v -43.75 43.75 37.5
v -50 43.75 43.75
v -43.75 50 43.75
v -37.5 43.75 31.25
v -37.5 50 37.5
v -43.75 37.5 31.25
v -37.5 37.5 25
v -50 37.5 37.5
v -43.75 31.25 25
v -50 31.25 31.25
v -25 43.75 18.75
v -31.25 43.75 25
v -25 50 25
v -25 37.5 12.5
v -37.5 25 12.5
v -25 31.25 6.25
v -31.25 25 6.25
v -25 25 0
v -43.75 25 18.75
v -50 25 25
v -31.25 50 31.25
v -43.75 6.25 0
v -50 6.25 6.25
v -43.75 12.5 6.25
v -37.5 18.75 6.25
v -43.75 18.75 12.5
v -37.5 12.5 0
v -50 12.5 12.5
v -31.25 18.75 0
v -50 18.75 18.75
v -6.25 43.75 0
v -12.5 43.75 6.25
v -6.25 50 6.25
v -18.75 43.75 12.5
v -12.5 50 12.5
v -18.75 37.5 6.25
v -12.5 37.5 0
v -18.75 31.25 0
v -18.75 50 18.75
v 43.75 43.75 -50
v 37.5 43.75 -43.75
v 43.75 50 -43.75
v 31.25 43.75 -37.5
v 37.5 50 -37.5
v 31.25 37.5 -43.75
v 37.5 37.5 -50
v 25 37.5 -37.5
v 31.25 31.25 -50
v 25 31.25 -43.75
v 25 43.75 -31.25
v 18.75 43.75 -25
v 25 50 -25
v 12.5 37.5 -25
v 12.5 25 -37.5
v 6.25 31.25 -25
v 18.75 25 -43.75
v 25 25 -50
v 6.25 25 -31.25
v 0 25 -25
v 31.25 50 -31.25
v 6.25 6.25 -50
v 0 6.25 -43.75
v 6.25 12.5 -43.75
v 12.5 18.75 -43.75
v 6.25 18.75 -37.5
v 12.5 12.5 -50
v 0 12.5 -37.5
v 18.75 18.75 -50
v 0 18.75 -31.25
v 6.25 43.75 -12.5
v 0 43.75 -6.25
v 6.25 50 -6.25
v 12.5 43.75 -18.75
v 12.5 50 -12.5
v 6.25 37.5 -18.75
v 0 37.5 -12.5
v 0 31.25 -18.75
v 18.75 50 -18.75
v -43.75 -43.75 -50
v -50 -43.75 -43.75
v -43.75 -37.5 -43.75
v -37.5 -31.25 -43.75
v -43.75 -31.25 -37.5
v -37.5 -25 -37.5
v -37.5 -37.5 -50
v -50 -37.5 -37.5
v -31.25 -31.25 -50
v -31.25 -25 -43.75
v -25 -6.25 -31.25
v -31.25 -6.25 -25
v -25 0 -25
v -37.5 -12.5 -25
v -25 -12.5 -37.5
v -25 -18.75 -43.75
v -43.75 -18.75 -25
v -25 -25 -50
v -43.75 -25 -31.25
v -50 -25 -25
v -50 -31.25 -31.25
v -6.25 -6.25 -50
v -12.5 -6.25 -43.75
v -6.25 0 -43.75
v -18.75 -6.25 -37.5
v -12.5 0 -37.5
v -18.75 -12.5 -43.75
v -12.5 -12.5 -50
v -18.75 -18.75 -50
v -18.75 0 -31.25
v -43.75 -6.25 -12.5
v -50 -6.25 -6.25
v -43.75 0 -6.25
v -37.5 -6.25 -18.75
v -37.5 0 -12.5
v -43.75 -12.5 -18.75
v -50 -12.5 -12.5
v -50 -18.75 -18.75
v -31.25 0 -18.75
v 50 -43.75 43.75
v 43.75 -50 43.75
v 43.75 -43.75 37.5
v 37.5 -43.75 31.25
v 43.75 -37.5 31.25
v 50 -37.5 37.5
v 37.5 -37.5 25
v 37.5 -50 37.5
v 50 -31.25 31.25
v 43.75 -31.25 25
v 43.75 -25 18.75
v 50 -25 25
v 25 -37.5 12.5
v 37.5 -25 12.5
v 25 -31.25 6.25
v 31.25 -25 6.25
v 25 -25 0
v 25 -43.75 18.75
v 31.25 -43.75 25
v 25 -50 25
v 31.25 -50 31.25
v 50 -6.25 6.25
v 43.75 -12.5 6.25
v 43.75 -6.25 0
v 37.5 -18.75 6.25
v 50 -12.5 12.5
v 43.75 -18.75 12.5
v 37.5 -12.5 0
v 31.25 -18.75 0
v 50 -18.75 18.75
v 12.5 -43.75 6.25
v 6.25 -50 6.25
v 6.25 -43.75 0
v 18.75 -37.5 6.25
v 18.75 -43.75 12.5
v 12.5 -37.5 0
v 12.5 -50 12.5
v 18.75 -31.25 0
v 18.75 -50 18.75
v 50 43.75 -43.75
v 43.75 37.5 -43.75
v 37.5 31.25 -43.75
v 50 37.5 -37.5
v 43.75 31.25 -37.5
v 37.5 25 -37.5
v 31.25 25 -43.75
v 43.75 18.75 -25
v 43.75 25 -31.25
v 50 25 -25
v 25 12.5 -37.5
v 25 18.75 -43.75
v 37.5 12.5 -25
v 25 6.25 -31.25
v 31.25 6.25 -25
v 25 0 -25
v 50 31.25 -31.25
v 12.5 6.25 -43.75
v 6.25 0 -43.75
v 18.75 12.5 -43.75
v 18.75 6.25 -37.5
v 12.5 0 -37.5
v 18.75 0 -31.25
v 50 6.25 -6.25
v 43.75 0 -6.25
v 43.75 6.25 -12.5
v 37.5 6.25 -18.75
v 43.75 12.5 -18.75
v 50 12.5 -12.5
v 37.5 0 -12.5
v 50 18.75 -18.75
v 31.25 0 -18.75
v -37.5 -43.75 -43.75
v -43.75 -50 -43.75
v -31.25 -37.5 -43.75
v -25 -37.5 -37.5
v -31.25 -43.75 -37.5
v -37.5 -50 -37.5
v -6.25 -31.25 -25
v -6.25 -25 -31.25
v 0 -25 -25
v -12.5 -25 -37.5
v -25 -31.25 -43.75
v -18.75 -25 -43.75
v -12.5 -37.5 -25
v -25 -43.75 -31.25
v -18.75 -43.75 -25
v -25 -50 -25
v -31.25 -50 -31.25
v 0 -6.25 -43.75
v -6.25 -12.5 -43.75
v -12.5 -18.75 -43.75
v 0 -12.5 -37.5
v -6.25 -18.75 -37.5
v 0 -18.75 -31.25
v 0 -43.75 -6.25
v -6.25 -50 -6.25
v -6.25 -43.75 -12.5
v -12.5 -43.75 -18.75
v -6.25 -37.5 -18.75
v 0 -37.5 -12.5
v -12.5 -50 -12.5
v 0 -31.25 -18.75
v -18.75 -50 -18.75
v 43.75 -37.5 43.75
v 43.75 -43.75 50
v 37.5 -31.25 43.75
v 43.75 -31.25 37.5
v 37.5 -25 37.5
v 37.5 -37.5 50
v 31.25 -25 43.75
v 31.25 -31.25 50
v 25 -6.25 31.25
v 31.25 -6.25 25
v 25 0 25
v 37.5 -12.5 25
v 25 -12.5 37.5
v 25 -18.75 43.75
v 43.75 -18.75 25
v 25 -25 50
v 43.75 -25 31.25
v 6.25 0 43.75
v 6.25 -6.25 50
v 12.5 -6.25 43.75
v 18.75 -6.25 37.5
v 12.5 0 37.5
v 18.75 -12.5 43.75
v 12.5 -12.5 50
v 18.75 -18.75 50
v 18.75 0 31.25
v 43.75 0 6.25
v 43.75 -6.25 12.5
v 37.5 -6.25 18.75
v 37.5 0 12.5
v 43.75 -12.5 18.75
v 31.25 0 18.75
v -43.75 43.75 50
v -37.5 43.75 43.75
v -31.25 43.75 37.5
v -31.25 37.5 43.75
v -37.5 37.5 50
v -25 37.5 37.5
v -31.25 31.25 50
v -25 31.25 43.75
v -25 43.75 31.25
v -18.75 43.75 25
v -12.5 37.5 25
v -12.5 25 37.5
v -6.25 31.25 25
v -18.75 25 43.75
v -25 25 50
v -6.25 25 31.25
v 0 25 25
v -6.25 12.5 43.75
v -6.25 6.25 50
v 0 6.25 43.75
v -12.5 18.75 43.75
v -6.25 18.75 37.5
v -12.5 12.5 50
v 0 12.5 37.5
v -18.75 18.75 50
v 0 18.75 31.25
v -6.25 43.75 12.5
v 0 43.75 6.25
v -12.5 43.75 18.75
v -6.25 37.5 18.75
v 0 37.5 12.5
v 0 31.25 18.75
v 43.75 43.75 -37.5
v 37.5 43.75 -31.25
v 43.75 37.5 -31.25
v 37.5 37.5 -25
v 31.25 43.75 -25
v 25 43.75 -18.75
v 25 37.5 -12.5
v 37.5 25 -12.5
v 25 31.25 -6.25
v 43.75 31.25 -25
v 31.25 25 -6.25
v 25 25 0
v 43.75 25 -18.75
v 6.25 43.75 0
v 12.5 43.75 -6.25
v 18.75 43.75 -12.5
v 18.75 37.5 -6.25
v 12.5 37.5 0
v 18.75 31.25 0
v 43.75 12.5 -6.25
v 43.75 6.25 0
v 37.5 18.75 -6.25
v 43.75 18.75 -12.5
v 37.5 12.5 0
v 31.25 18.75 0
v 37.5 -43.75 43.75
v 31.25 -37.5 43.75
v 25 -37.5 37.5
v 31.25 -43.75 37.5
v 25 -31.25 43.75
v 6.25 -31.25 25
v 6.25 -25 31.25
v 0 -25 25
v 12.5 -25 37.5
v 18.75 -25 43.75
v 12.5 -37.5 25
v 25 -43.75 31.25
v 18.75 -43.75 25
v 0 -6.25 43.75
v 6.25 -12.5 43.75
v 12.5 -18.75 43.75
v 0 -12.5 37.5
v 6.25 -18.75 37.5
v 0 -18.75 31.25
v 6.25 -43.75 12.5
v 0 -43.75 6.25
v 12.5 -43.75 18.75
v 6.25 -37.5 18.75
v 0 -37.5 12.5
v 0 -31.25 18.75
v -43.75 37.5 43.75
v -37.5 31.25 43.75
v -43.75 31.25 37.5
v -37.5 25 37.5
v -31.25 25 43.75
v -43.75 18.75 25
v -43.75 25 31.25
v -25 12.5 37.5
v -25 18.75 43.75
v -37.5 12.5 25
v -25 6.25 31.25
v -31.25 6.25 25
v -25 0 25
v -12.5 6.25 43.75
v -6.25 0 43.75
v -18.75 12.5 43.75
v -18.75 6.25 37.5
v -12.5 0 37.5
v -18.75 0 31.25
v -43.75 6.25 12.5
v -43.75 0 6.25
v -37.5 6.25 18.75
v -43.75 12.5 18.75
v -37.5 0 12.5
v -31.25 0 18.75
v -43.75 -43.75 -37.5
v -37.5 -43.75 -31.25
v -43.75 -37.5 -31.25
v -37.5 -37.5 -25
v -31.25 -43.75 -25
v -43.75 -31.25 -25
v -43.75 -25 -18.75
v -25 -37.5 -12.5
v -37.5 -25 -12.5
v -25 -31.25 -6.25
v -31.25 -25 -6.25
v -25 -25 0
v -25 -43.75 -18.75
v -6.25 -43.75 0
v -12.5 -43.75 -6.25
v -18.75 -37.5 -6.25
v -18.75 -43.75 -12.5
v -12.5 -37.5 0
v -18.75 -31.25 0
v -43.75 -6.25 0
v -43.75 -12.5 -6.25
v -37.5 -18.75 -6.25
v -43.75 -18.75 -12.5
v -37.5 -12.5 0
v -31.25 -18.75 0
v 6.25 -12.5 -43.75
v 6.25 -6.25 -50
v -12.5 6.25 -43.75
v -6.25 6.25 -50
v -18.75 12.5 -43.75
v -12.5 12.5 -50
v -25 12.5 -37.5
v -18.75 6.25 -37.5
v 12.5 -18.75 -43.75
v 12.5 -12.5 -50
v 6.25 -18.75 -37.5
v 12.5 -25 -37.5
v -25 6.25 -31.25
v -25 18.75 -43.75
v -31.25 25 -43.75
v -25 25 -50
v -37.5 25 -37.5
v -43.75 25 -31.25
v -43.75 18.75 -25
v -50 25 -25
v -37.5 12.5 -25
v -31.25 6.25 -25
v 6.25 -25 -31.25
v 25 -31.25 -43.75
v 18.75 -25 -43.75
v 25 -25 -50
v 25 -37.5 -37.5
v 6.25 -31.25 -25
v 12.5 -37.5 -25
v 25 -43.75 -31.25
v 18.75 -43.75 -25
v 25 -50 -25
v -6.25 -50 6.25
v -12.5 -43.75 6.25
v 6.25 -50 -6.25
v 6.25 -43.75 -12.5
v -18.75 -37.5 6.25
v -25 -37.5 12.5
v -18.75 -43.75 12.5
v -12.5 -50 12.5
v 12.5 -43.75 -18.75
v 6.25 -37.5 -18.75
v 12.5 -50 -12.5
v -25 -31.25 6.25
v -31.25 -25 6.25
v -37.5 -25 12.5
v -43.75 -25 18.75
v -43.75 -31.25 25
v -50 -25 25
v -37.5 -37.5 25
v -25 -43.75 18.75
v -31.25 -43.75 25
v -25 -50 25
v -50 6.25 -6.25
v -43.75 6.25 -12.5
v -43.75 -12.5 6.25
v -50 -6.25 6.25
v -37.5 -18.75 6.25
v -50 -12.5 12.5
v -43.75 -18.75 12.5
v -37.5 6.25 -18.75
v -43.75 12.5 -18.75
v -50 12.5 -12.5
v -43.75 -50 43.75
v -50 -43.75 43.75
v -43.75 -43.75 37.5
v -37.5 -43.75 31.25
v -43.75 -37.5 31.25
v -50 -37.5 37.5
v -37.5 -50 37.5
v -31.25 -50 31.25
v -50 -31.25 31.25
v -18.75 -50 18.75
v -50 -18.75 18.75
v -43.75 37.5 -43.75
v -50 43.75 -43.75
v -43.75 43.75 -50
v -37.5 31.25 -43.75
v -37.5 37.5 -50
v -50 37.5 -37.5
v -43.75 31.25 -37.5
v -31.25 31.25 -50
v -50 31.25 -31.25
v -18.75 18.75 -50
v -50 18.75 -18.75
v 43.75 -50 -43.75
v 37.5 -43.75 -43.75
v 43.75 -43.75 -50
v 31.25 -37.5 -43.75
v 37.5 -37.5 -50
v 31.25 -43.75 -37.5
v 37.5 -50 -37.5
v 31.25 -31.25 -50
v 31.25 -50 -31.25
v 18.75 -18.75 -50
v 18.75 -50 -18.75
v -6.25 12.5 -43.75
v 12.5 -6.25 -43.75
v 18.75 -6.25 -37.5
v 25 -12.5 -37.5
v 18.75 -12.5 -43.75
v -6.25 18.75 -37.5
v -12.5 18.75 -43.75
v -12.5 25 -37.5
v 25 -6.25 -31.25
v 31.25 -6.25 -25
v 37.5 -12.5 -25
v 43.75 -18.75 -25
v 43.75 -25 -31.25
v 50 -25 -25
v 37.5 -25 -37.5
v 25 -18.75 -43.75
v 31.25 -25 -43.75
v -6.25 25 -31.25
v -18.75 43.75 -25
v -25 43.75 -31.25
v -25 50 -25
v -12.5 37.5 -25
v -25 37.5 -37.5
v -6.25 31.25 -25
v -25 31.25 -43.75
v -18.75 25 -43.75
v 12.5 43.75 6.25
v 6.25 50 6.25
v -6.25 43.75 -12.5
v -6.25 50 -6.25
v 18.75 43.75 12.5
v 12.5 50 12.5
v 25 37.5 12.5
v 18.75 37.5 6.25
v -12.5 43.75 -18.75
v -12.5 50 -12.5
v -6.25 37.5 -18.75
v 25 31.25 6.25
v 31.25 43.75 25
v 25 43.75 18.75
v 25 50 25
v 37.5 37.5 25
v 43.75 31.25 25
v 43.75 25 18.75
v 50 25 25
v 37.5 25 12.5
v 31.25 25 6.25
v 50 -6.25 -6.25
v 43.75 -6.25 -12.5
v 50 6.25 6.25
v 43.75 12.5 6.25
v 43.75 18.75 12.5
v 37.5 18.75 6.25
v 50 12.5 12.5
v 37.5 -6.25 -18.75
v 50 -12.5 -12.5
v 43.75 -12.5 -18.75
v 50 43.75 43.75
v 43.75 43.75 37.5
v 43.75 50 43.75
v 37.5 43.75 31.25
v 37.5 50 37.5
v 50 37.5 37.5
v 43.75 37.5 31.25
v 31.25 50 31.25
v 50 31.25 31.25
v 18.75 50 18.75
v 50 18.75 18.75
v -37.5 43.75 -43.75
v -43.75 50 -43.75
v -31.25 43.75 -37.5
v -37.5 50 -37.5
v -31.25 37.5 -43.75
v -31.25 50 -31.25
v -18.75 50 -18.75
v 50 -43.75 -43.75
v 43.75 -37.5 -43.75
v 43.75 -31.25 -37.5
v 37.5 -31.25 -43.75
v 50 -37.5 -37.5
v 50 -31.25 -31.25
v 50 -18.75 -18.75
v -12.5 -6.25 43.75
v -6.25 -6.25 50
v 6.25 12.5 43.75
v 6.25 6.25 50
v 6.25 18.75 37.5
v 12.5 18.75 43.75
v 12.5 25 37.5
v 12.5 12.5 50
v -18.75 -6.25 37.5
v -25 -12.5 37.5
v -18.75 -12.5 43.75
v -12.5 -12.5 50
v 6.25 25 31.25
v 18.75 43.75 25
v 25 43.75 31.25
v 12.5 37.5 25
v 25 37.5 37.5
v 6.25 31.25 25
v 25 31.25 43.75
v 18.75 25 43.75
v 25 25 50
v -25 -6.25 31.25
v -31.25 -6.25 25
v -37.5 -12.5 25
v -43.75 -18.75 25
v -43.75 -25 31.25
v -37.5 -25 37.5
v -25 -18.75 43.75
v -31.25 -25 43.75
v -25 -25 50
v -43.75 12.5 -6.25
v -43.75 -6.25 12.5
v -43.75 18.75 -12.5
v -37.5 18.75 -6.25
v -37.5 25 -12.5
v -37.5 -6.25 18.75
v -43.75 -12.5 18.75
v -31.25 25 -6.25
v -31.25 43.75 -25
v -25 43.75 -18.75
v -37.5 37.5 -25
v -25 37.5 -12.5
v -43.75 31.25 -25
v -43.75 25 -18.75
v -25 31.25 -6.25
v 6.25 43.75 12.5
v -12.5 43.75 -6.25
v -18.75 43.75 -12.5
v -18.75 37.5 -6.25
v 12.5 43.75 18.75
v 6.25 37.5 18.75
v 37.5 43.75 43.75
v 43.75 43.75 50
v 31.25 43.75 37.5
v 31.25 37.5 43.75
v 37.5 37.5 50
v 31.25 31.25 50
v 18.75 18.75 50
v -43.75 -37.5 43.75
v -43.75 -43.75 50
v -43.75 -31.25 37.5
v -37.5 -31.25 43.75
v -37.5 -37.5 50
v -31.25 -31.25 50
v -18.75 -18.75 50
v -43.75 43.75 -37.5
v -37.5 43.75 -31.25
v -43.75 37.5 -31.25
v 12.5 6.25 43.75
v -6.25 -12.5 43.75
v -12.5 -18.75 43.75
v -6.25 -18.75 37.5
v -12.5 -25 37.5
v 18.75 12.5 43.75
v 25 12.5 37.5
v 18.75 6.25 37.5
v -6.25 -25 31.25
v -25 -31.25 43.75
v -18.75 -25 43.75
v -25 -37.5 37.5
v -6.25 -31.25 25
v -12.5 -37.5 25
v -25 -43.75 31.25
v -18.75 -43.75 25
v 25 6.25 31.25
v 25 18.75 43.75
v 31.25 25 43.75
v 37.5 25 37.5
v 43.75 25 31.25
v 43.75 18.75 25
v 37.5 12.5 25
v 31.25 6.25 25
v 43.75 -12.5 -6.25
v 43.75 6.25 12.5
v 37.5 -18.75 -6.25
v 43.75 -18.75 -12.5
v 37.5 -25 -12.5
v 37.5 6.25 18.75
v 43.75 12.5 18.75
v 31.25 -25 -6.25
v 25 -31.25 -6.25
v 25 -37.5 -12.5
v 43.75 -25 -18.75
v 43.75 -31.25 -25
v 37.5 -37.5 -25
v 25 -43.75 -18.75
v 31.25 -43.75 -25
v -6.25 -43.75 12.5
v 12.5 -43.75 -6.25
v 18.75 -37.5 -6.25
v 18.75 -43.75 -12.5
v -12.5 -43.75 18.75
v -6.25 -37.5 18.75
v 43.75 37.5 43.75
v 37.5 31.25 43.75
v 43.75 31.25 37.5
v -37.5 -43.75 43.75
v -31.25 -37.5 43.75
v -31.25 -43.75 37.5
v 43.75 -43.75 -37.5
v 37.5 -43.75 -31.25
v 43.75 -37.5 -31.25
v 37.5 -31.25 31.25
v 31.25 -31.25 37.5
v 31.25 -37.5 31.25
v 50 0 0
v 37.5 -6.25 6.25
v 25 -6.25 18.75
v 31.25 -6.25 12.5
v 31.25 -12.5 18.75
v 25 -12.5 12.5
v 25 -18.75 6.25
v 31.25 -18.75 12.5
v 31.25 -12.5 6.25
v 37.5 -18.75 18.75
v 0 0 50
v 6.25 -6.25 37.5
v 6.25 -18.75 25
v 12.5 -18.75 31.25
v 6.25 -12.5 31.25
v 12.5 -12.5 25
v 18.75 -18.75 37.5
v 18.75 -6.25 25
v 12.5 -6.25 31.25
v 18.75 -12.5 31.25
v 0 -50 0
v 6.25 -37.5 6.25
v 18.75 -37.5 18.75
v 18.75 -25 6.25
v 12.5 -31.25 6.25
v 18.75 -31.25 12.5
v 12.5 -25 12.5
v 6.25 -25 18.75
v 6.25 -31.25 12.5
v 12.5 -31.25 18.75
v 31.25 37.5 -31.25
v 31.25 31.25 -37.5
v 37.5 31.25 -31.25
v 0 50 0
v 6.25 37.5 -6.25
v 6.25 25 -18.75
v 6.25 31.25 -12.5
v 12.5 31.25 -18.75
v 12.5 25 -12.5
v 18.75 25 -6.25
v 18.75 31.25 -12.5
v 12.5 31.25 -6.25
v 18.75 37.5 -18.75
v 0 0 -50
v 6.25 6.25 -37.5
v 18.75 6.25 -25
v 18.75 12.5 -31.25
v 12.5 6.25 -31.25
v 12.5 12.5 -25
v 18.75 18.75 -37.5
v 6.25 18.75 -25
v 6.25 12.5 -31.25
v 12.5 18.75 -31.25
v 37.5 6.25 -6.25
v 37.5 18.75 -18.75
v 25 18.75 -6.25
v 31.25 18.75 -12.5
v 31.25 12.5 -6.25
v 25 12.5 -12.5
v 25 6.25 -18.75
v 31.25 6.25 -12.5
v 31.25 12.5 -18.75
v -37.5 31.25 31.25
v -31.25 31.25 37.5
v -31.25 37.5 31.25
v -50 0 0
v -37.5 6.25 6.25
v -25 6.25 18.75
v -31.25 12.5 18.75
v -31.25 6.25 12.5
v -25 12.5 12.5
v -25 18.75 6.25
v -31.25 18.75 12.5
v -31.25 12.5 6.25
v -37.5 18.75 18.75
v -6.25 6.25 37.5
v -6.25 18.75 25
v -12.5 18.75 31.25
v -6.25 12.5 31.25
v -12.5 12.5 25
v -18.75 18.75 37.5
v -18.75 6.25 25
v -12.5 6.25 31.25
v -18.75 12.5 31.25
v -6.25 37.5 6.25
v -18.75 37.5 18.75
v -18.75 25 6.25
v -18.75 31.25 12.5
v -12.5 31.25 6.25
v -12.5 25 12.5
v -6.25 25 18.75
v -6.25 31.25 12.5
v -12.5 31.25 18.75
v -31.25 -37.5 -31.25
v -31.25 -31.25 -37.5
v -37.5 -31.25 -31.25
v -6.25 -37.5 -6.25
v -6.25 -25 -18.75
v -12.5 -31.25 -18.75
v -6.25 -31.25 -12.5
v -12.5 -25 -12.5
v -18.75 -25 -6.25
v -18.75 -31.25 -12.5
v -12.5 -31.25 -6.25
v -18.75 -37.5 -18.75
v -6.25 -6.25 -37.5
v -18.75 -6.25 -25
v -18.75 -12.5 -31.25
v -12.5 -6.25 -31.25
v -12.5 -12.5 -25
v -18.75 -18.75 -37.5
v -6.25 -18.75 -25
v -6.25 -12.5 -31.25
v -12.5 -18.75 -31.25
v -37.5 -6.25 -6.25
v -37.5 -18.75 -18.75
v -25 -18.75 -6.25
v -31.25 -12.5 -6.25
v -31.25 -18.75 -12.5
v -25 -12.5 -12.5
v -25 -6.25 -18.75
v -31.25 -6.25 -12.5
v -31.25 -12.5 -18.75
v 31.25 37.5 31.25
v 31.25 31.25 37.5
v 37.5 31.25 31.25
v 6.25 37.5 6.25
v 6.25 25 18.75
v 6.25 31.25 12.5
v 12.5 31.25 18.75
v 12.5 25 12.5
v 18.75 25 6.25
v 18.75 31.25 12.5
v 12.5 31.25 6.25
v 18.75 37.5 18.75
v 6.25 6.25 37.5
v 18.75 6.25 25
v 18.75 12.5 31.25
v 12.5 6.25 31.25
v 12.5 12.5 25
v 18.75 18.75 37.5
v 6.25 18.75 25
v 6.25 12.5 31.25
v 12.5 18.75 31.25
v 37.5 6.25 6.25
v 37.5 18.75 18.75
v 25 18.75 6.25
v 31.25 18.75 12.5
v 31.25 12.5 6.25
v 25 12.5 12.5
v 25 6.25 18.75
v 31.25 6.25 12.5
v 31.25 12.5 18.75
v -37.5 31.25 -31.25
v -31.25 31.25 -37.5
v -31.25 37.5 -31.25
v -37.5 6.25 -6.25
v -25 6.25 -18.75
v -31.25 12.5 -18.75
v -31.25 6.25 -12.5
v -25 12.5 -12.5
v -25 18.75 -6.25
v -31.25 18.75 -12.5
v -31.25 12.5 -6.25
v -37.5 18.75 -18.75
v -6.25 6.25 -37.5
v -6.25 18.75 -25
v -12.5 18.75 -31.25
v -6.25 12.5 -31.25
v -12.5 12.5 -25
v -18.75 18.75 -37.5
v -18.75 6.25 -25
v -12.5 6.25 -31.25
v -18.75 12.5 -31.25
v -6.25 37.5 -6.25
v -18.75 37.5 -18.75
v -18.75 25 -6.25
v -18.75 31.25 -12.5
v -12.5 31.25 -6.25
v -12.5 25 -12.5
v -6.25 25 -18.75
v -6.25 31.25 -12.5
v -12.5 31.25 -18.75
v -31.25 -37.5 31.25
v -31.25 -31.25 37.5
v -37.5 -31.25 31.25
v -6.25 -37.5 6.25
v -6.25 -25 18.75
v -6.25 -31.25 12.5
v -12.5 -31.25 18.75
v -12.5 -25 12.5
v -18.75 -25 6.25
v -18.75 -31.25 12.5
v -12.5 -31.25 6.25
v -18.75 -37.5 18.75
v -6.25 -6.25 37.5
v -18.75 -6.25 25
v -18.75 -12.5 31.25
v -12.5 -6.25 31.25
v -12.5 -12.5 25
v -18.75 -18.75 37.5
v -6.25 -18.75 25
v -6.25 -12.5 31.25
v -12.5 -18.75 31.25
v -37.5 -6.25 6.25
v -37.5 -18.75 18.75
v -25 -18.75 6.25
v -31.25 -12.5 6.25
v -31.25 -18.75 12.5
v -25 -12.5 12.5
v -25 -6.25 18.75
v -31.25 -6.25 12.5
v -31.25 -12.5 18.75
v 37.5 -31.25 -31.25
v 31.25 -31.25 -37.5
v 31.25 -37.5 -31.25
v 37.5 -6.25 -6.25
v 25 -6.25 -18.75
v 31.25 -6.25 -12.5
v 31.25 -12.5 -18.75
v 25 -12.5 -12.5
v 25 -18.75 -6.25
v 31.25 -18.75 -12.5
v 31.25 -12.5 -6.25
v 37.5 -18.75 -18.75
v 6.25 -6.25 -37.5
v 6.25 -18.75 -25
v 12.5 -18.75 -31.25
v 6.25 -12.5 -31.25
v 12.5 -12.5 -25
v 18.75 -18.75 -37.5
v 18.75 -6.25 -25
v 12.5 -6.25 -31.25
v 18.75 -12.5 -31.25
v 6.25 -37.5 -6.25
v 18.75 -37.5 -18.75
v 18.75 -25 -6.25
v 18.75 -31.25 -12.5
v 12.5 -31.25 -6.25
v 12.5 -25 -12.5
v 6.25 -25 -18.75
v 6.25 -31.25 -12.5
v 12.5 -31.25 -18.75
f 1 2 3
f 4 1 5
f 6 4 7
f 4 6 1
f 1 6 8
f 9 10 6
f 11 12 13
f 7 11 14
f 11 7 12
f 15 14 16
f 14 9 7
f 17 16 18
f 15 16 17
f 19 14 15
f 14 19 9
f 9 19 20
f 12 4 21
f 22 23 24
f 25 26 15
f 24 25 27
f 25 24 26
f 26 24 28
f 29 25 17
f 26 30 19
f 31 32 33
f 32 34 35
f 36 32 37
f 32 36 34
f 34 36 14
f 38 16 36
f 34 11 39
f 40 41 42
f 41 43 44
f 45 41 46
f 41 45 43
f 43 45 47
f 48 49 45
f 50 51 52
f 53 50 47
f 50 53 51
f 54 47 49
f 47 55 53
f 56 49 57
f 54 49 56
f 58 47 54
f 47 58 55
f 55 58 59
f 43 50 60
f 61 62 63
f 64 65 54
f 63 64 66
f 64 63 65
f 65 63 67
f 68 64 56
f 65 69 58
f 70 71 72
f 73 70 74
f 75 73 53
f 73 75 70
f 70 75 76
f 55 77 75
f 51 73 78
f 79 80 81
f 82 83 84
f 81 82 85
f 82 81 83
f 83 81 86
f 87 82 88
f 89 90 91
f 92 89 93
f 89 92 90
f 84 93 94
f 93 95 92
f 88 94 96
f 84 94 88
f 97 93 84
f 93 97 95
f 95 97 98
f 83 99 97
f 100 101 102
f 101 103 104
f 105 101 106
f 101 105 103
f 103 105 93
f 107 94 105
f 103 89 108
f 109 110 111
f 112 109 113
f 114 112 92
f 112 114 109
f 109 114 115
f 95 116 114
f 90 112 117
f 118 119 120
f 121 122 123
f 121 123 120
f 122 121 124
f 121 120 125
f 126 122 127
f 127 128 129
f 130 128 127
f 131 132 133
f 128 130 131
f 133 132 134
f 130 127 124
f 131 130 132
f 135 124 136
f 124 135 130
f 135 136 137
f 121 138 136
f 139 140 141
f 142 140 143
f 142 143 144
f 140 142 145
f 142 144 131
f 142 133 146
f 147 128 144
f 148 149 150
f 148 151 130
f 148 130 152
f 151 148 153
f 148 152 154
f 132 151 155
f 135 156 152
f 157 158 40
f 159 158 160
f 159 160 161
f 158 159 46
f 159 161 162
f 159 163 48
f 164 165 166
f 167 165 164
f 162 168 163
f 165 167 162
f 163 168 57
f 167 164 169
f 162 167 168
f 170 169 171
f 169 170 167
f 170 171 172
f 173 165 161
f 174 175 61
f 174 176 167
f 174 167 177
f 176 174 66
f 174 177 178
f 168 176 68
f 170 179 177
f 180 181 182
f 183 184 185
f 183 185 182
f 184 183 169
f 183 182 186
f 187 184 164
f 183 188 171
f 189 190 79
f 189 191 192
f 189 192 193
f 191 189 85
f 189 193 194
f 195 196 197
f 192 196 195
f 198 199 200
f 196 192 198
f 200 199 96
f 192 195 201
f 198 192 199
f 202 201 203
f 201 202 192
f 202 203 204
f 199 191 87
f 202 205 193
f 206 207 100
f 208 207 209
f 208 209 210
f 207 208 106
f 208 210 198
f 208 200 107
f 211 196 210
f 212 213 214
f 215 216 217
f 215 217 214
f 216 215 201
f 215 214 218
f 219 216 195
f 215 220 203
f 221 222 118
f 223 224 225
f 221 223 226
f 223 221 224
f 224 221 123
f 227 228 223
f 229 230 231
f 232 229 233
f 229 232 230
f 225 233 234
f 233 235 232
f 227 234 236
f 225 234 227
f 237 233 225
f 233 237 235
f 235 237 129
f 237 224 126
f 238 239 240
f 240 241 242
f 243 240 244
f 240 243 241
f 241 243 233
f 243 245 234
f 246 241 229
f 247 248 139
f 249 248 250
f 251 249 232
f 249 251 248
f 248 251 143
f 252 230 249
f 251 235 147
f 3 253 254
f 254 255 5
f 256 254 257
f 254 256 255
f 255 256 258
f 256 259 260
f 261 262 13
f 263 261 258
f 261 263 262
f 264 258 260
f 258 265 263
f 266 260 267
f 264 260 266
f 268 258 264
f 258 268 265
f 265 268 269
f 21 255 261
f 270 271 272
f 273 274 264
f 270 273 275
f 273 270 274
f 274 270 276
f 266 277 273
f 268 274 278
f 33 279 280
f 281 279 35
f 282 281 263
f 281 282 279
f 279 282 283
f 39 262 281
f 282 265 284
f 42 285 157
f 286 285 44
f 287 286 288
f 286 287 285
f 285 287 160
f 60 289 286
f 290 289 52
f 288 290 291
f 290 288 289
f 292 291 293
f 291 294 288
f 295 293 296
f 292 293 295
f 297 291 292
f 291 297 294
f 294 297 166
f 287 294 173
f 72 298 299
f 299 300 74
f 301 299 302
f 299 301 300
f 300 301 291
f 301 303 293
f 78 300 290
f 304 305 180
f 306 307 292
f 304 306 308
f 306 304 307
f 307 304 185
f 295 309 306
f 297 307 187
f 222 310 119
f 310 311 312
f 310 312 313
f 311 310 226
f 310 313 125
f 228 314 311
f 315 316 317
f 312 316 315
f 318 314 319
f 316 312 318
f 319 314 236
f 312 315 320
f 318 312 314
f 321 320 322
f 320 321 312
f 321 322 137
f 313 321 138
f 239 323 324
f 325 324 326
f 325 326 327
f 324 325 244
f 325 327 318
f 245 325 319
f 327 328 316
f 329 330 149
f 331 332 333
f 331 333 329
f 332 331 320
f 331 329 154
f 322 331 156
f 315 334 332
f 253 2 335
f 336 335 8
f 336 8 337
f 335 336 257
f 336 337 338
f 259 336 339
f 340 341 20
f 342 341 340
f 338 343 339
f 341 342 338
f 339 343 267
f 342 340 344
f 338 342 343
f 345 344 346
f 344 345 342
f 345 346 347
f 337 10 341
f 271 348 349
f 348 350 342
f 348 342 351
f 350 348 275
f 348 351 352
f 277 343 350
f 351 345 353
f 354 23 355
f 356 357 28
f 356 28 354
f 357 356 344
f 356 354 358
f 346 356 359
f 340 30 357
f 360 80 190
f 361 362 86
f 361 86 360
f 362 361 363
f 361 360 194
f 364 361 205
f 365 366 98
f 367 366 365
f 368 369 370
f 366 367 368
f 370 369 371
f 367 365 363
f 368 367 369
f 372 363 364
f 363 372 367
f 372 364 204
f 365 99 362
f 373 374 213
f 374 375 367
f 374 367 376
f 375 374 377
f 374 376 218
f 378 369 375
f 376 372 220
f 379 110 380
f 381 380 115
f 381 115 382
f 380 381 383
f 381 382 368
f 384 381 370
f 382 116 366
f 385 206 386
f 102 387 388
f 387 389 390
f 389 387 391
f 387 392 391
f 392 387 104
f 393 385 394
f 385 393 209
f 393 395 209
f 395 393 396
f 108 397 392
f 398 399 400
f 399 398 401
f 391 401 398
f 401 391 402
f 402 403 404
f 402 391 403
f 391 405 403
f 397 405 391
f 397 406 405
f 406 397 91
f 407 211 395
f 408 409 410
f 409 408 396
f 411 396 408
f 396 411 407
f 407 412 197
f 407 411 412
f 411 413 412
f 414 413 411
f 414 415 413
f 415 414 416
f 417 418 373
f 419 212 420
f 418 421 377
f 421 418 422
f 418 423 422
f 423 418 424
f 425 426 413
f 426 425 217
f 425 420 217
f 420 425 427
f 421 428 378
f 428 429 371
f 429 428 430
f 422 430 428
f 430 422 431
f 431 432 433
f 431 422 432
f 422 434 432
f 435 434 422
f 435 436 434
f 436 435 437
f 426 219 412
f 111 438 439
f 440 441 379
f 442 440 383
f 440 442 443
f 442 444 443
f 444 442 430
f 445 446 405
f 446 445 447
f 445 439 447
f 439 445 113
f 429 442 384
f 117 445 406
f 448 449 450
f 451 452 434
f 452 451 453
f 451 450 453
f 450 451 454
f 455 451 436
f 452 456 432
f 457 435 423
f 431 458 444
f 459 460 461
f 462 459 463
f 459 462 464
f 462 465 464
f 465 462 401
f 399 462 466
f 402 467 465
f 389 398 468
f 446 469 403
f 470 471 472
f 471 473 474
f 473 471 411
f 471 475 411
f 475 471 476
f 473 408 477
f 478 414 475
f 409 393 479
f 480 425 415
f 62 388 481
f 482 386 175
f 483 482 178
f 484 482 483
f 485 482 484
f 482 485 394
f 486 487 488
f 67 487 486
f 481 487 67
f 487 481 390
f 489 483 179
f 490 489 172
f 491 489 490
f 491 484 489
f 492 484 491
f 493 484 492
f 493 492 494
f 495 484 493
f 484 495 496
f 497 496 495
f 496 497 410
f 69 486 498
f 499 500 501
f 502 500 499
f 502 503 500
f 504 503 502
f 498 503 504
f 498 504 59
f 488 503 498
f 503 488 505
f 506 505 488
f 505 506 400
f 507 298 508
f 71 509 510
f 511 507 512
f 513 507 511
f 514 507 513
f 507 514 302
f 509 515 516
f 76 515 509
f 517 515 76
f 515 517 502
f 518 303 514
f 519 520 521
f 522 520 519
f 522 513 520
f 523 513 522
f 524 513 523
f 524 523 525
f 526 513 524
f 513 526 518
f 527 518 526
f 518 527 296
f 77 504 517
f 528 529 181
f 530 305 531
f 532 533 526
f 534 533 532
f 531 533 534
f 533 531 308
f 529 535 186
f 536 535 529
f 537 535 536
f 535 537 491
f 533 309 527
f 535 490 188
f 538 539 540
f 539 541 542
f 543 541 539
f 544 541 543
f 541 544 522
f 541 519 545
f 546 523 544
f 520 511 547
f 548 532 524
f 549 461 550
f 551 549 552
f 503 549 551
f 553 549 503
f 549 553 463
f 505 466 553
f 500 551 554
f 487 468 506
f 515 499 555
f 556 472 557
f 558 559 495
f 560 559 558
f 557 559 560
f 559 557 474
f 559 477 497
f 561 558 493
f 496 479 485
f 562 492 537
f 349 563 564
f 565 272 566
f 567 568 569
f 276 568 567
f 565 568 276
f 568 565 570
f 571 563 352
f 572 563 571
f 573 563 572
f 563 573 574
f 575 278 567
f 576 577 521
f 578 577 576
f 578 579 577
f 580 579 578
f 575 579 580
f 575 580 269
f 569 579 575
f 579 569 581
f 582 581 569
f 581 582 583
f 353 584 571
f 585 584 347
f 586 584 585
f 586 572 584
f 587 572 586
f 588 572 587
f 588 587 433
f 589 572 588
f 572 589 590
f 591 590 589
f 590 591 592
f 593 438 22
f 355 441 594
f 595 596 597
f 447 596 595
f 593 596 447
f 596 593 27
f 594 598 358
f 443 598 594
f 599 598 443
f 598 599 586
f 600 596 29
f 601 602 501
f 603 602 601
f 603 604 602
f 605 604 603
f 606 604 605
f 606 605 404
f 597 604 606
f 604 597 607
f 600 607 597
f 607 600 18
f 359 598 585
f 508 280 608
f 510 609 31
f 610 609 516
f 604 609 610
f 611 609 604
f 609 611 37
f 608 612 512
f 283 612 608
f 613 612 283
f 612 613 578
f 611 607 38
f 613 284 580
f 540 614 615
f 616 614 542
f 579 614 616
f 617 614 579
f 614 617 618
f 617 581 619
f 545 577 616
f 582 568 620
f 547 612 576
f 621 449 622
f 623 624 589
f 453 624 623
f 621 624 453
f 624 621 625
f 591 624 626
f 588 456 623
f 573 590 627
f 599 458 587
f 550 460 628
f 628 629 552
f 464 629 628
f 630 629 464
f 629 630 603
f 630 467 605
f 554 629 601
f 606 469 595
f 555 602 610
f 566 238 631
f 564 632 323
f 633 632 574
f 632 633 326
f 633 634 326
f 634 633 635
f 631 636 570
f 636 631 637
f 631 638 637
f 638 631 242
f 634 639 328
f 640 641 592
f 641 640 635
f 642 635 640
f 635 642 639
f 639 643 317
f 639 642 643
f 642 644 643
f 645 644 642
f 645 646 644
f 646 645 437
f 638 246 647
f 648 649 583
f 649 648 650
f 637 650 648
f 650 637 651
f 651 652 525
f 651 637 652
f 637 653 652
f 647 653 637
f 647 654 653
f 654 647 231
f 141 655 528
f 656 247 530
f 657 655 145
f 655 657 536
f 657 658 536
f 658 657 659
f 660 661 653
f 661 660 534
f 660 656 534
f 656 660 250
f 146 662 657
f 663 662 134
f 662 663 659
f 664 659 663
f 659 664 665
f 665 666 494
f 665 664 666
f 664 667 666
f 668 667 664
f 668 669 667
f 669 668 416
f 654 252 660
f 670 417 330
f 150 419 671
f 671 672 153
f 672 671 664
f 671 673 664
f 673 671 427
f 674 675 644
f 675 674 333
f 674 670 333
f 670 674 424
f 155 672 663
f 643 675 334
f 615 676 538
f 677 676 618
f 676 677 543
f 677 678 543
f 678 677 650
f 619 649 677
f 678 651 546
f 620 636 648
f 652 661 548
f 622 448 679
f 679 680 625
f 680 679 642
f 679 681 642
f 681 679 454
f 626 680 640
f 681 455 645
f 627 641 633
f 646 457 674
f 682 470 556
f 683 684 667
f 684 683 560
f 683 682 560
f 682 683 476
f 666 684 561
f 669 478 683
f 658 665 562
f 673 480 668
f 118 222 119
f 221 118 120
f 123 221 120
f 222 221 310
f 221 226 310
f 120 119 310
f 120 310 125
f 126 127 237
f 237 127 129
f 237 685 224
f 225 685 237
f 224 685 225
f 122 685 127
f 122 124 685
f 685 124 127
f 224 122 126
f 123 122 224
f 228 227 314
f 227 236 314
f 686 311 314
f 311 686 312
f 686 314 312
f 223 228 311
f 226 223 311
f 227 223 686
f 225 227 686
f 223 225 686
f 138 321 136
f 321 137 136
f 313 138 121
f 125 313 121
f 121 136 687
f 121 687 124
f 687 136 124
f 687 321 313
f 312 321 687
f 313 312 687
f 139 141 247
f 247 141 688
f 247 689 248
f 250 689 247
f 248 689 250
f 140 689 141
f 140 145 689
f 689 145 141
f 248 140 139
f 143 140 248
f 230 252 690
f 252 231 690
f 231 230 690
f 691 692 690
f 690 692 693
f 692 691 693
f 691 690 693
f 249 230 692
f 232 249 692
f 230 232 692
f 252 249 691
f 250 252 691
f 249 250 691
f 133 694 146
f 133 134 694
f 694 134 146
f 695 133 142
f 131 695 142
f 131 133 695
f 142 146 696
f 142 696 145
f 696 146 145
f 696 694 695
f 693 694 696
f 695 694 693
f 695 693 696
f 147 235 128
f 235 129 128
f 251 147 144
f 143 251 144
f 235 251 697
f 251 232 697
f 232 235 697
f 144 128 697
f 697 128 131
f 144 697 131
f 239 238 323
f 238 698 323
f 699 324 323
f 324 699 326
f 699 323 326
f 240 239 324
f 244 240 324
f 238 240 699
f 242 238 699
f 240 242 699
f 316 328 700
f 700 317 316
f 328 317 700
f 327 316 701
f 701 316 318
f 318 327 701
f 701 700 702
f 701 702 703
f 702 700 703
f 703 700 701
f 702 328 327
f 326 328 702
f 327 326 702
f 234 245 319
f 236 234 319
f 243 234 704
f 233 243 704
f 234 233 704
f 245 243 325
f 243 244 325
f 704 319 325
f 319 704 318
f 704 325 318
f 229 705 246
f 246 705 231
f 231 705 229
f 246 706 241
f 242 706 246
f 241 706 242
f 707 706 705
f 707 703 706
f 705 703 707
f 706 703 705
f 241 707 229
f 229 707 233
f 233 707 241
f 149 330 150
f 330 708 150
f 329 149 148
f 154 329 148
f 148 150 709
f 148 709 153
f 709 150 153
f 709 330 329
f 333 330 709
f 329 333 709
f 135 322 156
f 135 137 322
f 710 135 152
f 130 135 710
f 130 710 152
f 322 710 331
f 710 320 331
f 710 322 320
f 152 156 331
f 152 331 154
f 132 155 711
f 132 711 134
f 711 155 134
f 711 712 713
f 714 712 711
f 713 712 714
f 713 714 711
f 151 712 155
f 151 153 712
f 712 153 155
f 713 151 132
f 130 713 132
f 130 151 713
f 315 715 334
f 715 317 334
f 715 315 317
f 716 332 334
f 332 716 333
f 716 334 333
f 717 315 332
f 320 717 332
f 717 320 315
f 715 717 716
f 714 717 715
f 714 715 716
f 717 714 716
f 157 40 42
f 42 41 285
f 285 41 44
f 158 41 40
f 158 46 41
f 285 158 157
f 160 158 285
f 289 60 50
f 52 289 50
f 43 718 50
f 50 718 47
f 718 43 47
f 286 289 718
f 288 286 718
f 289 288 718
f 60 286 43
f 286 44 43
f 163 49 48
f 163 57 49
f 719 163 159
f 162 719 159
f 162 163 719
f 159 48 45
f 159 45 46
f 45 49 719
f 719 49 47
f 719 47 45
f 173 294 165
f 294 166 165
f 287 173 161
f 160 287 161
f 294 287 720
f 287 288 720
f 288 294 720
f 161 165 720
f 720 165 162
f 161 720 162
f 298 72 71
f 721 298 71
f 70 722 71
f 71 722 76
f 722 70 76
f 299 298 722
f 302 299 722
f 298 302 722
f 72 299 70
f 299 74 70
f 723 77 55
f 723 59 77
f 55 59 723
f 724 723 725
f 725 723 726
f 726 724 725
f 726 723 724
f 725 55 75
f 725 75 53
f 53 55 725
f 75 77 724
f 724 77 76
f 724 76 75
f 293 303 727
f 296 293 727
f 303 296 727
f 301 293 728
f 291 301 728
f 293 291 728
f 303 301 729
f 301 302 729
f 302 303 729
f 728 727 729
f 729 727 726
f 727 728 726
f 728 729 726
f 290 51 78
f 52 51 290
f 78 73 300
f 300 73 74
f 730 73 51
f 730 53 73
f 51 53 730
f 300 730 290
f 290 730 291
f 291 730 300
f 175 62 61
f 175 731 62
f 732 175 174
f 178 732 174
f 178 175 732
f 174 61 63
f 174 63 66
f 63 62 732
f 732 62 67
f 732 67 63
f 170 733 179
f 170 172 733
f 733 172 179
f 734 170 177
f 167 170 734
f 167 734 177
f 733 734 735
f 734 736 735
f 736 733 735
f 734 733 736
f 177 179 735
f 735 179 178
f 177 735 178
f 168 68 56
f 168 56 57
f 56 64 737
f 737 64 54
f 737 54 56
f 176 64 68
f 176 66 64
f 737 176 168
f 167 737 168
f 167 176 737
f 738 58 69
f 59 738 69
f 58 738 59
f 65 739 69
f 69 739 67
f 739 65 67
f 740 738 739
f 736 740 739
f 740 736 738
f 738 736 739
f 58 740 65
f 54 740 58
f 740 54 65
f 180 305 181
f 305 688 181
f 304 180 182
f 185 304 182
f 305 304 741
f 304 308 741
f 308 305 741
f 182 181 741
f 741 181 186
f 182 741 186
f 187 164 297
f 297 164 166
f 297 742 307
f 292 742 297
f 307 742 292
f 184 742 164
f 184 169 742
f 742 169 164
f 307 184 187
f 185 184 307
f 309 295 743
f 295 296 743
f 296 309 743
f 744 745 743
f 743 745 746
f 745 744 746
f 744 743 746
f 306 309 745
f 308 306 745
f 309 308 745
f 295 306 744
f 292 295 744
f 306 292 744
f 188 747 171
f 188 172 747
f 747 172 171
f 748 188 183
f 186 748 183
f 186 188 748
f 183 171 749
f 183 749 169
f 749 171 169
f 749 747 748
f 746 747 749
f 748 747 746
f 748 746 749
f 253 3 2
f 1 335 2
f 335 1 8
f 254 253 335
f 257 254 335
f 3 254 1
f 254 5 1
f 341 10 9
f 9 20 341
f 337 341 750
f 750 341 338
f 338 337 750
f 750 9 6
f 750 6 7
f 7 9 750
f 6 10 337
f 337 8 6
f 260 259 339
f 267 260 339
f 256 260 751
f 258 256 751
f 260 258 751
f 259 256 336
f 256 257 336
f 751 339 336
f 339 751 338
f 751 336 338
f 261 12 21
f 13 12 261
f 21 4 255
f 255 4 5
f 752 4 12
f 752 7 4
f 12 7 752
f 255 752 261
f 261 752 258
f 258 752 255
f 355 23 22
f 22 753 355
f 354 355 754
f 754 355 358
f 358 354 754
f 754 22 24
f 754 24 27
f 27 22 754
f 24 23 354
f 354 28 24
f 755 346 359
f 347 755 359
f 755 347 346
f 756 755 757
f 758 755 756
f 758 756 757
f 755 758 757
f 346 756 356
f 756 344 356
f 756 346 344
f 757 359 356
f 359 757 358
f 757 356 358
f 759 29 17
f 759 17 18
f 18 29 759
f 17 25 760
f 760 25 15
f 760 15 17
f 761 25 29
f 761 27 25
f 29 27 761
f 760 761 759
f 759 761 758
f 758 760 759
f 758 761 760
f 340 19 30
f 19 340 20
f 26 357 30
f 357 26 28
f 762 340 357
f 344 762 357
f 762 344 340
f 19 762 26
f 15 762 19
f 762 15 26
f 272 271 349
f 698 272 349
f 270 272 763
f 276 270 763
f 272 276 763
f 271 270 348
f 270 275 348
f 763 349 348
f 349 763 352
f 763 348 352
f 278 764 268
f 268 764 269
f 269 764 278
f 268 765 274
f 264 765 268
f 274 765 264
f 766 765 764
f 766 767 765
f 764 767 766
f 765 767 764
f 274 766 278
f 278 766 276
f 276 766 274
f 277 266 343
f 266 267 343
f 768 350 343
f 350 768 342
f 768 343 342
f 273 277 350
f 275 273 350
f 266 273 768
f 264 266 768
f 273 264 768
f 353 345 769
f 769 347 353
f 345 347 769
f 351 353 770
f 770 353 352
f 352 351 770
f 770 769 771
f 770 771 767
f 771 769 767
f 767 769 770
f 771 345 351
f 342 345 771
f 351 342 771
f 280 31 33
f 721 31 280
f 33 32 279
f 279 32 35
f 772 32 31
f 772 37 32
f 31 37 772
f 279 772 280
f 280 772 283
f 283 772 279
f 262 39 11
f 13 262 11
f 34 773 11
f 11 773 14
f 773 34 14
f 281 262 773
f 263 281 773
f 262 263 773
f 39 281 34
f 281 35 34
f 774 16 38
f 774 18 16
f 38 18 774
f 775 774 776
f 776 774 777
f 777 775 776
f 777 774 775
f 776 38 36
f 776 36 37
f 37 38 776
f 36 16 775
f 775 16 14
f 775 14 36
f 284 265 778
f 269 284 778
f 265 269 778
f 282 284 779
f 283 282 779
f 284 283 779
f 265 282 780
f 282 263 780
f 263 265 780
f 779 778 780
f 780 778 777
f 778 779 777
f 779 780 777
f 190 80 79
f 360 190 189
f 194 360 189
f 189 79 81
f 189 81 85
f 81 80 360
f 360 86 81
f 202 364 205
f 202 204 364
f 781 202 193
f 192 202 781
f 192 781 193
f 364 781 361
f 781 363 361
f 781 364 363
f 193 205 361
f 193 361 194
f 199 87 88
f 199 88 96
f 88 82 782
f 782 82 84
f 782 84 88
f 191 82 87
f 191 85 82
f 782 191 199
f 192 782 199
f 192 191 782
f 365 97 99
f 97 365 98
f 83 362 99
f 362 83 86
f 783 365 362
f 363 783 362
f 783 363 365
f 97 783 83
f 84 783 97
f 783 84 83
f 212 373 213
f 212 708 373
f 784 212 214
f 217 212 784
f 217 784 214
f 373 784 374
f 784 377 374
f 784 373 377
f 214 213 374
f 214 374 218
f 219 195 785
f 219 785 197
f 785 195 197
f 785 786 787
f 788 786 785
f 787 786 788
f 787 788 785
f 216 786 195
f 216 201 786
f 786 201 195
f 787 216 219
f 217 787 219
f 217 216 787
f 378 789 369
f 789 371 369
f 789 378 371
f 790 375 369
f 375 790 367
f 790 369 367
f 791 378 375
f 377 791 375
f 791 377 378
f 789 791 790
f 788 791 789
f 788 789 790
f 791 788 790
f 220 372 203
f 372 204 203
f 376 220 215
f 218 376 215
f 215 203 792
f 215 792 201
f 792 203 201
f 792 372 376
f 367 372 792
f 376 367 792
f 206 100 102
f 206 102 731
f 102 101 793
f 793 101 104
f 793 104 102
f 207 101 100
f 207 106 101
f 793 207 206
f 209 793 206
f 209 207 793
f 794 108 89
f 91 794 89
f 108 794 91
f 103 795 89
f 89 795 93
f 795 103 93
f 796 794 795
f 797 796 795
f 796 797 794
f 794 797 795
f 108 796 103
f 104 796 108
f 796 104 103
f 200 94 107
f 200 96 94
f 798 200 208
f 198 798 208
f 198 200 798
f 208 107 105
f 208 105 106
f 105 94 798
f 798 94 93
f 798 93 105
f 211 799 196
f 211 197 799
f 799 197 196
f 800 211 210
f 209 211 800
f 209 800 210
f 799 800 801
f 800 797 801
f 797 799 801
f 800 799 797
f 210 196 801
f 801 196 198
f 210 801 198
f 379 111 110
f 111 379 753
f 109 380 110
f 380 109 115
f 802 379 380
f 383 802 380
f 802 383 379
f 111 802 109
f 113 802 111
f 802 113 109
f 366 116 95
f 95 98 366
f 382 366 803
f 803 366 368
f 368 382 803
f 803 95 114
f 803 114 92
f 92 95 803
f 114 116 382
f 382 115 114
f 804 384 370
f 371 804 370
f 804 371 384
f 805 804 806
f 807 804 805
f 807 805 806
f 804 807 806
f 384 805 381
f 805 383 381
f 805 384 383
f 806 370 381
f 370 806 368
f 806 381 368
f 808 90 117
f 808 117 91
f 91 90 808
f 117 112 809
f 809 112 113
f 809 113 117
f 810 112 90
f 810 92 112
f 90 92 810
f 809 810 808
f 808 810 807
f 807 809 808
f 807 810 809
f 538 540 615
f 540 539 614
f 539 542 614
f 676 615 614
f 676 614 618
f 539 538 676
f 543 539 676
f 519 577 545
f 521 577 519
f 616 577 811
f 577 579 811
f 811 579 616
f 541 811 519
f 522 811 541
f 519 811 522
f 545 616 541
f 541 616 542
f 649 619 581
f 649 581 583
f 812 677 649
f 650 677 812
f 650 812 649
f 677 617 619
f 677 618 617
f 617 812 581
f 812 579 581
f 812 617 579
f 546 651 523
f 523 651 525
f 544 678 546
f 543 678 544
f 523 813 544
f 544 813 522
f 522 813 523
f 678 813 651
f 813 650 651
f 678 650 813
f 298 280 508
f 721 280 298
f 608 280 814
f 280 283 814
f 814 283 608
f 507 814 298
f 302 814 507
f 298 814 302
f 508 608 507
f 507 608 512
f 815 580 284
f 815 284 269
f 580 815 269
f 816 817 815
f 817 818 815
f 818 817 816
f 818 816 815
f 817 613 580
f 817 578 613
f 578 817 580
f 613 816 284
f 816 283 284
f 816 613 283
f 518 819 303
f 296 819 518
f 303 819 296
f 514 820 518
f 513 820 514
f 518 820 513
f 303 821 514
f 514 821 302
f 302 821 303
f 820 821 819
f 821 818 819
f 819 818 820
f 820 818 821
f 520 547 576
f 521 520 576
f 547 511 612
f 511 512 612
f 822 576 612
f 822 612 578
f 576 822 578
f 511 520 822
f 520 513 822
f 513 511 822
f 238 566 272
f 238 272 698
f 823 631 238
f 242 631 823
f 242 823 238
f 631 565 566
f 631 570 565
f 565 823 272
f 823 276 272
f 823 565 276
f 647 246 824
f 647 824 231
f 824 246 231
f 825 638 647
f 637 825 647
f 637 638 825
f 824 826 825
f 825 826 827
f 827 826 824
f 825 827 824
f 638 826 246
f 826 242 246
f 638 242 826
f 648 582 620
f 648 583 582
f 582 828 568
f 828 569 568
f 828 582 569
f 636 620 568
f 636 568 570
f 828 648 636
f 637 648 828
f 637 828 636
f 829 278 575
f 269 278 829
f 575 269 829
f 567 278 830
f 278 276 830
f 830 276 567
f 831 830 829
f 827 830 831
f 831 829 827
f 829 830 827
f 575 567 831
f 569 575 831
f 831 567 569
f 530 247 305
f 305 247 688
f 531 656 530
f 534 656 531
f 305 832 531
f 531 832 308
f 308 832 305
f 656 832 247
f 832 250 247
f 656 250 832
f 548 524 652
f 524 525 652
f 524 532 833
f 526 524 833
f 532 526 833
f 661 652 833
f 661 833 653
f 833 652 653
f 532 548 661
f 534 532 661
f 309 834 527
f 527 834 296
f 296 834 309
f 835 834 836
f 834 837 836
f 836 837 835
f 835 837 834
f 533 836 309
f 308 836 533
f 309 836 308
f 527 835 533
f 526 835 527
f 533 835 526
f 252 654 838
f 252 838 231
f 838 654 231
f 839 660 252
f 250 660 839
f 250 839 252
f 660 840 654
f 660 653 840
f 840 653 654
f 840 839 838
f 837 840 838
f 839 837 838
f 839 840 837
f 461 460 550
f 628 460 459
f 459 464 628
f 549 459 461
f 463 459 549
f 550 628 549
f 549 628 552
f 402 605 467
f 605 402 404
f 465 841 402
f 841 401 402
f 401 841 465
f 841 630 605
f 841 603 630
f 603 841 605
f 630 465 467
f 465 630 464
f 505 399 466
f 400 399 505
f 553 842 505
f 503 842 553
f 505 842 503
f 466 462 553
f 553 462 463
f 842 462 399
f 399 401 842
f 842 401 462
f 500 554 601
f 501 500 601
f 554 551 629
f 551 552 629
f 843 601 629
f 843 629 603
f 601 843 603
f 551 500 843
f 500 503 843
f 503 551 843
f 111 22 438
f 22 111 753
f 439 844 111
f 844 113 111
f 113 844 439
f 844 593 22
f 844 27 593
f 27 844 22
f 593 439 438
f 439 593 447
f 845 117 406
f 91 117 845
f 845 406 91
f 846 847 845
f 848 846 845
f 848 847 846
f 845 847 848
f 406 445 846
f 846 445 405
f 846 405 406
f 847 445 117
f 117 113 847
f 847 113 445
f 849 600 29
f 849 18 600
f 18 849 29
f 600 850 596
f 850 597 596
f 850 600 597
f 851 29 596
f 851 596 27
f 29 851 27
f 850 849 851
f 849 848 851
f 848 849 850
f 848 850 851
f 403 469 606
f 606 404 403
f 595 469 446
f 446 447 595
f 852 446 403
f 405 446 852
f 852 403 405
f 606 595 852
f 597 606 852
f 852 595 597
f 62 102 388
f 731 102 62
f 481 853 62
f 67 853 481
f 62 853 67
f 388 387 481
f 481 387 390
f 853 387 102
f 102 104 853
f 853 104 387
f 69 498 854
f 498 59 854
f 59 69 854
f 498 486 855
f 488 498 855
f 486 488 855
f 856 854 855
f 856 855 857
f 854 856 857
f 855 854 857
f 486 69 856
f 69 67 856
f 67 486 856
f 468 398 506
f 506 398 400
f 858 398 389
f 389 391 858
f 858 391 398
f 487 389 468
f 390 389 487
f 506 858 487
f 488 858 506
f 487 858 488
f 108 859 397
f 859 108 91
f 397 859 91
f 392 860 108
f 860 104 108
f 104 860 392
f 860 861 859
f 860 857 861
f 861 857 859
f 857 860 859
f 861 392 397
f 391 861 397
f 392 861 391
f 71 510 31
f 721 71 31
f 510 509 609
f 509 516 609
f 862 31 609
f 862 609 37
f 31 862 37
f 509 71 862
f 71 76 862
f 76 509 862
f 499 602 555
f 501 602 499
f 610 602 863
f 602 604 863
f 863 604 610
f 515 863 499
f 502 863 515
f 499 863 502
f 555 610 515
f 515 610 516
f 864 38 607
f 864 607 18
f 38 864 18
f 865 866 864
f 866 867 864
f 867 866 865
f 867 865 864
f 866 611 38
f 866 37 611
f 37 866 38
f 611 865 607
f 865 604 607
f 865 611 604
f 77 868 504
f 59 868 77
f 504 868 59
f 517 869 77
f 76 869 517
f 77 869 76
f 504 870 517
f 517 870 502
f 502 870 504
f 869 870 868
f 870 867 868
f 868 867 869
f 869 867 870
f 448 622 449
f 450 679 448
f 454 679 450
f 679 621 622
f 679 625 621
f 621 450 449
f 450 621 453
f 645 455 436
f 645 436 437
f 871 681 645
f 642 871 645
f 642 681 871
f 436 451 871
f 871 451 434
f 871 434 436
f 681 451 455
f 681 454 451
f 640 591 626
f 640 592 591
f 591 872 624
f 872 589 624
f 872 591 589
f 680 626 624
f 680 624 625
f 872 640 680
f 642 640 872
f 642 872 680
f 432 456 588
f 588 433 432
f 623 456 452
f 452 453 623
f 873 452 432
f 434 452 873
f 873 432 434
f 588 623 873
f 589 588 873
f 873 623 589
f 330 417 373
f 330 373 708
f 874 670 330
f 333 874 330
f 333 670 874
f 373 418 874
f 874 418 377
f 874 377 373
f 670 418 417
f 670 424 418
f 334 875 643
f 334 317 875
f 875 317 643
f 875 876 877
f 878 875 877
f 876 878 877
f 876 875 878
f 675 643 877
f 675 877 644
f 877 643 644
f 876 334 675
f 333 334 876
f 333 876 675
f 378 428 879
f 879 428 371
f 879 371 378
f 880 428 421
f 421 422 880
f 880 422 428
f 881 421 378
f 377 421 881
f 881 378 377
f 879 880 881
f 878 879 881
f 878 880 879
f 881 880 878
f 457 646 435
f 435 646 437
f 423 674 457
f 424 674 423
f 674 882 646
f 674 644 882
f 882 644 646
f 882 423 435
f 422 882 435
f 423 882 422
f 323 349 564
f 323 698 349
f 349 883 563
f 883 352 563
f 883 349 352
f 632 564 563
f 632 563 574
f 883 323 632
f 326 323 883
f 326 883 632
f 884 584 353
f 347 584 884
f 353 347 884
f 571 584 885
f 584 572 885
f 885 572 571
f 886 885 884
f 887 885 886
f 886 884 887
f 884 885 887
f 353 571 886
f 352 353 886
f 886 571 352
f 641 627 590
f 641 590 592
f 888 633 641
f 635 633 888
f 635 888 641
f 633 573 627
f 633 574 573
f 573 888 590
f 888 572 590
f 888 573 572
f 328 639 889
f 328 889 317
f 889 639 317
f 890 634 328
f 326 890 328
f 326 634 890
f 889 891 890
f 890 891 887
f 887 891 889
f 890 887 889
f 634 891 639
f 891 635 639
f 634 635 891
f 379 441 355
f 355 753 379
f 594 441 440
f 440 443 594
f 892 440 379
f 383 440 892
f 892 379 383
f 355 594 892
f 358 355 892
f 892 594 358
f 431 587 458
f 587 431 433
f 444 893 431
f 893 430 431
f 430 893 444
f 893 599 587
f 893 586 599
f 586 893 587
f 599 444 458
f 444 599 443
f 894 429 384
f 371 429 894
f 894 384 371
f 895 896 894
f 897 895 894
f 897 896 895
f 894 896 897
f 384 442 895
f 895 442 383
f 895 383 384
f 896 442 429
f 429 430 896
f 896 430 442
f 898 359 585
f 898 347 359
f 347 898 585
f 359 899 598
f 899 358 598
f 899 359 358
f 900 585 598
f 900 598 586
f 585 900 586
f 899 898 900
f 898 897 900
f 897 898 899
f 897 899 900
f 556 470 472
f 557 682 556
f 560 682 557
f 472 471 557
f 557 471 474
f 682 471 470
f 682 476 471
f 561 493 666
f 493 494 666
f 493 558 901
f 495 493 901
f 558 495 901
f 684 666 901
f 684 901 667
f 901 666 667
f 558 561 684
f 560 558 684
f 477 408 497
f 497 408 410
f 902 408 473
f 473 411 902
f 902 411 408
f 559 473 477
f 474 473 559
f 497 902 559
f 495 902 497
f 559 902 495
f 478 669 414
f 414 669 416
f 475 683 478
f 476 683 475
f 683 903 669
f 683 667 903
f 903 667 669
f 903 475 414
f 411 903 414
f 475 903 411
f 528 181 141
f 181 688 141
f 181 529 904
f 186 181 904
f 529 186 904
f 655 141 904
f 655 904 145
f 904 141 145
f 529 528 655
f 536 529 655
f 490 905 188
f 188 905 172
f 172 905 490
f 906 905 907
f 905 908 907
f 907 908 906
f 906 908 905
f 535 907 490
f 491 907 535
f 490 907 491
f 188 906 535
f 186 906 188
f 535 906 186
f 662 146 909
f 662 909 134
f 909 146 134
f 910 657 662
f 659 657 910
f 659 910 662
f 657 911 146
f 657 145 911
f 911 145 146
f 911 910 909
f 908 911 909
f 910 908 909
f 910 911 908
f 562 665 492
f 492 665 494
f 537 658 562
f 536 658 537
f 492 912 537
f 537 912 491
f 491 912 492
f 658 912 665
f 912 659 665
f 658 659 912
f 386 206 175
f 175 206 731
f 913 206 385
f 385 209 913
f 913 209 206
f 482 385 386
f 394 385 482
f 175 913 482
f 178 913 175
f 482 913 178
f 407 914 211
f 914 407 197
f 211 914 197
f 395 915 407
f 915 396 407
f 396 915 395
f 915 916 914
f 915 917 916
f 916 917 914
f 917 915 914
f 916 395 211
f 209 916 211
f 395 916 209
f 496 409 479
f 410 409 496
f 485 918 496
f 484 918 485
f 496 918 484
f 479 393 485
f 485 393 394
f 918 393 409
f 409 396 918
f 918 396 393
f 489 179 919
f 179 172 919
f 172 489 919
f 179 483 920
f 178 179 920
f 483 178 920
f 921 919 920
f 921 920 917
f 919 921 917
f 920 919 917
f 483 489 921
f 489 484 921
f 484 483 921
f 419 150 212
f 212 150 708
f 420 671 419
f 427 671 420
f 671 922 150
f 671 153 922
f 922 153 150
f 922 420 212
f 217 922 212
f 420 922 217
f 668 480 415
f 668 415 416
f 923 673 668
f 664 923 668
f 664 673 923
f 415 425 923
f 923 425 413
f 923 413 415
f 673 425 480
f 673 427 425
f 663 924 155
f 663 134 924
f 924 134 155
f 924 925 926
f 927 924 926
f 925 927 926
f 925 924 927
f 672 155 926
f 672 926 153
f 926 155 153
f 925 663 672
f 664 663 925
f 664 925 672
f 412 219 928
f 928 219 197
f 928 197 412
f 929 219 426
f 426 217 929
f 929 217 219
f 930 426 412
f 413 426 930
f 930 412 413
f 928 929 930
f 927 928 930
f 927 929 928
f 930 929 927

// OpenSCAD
module tetra(){
    points = [[-1,-1,-1], [1,1,-1], [-1,1,1], [1,-1,1]];
polyhedron(points, [[0,2,1], [0,1,3], [1,2,3], [0,3,2]]);
}

module s_tetra(iteration, size, overlap){
    if (iteration == 0){
        echo(size);
        scale(size + overlap) tetra();
    } else {
        echo(size);
        #rotate(R0) translate(size/2 * [1,-1,1]) s_tetra(iteration-1, size/2, overlap);
        mirror(Z) rotate(R90) translate(size/2 * [1,-1,1])
            s_tetra(iteration-1, size/2, overlap);
        rotate(R180) translate(size/2 * [1,-1,1]) s_tetra(iteration-1, size/2, overlap);
        mirror(Z) rotate(R270) translate(size/2 * [1,-1,1]) 
            s_tetra(iteration-1, size/2, overlap);
    }
}

module stellated_octo(iteration=0, size=1, overlap=0){
    s_tetra(iteration, size, overlap);
    rotate([0, 0, 90]) s_tetra(iteration, size, overlap);
    
}

module octo(){
    intersection(){
        tetra();
        rotate(R90) tetra();
    }
}
    
    
//#stellated_octo();
I = [1, 1, 1];
Z = [0, 0, 1];
R0 = [0, 0, 0];
R90 = [0, 0, 90];
R180 = [0, 0, 180];
R270 = [0, 0, 270];

sqrt22 = sqrt(2)/2;

iteration = 3;
size =4 * 2 ^ iteration;
overlap = 1;
s = size + overlap;

//octo();
//translate([.5, .5, .5]) rotate(0, [1, 1, 0]) scale(.5) octo();
//translate([-.5, -.5, .5]) rotate(0, [1, 1, 0]) scale(.5) octo();
//translate([.75, .75, .75]) rotate(0, [1, 1, 0]) scale(.25) octo();
//translate([-.75, -.75, .75]) rotate(0, [1, 1, 0]) scale(.25) octo();
//
//translate([-.5, .5, -.5]) rotate(0, [1, 1, 0]) scale(.5) octo();
//translate([.5, -.5, -.5]) rotate(0, [1, 1, 0]) scale(.5) octo();
//translate([-.75, .75, -.75]) rotate(0, [1, 1, 0]) scale(.25) octo();
//translate([.75, -.75, -.75]) rotate(0, [1, 1, 0]) scale(.25) octo();


//rotate(90, [1, -.5, 0]) octo();

//render()
//union(){
////    octo();
//     rotate(60, [1, 1, 1]) scale([.5, .5 ,1.1]) #octo();
//}

//stellated_octo(iteration, size, overlap);


//rotate(R0) translate(size * I) scale(s) stellated_octo();
//rotate(R90) translate(size * I) scale(s) stellated_octo();
//rotate(R180) translate(size * I) scale(s) stellated_octo();
//rotate(R270) translate(size * I) scale(s) stellated_octo();
//rotate(R0) translate(-size * I) scale(s) stellated_octo();
//rotate(R90) translate(-size * I) scale(s) stellated_octo();
//rotate(R180) translate(-size * I) scale(s) stellated_octo();
//rotate(R270) translate(-size * I) scale(s) stellated_octo();

//rotate(R0) translate(size/2 * [1,-1,1]) scale(s) tetra();
//mirror(Z) rotate(R90) translate(size/2 * [1,-1,1]) scale(s) tetra();
//rotate(R180) translate(size/2 * [1,-1,1]) scale(s) tetra();
//mirror(Z) rotate(R270) translate(size/2 * [1,-1,1]) scale(s) tetra();

//s_tetra(iteration, size, overlap);


render()
scale(50)
difference(){
    stellated_octo();
    intersection(){
//        tetra();
        rotate([0, 0, 0]) scale(1) stellated_octo(iteration = 4);
    }
}
